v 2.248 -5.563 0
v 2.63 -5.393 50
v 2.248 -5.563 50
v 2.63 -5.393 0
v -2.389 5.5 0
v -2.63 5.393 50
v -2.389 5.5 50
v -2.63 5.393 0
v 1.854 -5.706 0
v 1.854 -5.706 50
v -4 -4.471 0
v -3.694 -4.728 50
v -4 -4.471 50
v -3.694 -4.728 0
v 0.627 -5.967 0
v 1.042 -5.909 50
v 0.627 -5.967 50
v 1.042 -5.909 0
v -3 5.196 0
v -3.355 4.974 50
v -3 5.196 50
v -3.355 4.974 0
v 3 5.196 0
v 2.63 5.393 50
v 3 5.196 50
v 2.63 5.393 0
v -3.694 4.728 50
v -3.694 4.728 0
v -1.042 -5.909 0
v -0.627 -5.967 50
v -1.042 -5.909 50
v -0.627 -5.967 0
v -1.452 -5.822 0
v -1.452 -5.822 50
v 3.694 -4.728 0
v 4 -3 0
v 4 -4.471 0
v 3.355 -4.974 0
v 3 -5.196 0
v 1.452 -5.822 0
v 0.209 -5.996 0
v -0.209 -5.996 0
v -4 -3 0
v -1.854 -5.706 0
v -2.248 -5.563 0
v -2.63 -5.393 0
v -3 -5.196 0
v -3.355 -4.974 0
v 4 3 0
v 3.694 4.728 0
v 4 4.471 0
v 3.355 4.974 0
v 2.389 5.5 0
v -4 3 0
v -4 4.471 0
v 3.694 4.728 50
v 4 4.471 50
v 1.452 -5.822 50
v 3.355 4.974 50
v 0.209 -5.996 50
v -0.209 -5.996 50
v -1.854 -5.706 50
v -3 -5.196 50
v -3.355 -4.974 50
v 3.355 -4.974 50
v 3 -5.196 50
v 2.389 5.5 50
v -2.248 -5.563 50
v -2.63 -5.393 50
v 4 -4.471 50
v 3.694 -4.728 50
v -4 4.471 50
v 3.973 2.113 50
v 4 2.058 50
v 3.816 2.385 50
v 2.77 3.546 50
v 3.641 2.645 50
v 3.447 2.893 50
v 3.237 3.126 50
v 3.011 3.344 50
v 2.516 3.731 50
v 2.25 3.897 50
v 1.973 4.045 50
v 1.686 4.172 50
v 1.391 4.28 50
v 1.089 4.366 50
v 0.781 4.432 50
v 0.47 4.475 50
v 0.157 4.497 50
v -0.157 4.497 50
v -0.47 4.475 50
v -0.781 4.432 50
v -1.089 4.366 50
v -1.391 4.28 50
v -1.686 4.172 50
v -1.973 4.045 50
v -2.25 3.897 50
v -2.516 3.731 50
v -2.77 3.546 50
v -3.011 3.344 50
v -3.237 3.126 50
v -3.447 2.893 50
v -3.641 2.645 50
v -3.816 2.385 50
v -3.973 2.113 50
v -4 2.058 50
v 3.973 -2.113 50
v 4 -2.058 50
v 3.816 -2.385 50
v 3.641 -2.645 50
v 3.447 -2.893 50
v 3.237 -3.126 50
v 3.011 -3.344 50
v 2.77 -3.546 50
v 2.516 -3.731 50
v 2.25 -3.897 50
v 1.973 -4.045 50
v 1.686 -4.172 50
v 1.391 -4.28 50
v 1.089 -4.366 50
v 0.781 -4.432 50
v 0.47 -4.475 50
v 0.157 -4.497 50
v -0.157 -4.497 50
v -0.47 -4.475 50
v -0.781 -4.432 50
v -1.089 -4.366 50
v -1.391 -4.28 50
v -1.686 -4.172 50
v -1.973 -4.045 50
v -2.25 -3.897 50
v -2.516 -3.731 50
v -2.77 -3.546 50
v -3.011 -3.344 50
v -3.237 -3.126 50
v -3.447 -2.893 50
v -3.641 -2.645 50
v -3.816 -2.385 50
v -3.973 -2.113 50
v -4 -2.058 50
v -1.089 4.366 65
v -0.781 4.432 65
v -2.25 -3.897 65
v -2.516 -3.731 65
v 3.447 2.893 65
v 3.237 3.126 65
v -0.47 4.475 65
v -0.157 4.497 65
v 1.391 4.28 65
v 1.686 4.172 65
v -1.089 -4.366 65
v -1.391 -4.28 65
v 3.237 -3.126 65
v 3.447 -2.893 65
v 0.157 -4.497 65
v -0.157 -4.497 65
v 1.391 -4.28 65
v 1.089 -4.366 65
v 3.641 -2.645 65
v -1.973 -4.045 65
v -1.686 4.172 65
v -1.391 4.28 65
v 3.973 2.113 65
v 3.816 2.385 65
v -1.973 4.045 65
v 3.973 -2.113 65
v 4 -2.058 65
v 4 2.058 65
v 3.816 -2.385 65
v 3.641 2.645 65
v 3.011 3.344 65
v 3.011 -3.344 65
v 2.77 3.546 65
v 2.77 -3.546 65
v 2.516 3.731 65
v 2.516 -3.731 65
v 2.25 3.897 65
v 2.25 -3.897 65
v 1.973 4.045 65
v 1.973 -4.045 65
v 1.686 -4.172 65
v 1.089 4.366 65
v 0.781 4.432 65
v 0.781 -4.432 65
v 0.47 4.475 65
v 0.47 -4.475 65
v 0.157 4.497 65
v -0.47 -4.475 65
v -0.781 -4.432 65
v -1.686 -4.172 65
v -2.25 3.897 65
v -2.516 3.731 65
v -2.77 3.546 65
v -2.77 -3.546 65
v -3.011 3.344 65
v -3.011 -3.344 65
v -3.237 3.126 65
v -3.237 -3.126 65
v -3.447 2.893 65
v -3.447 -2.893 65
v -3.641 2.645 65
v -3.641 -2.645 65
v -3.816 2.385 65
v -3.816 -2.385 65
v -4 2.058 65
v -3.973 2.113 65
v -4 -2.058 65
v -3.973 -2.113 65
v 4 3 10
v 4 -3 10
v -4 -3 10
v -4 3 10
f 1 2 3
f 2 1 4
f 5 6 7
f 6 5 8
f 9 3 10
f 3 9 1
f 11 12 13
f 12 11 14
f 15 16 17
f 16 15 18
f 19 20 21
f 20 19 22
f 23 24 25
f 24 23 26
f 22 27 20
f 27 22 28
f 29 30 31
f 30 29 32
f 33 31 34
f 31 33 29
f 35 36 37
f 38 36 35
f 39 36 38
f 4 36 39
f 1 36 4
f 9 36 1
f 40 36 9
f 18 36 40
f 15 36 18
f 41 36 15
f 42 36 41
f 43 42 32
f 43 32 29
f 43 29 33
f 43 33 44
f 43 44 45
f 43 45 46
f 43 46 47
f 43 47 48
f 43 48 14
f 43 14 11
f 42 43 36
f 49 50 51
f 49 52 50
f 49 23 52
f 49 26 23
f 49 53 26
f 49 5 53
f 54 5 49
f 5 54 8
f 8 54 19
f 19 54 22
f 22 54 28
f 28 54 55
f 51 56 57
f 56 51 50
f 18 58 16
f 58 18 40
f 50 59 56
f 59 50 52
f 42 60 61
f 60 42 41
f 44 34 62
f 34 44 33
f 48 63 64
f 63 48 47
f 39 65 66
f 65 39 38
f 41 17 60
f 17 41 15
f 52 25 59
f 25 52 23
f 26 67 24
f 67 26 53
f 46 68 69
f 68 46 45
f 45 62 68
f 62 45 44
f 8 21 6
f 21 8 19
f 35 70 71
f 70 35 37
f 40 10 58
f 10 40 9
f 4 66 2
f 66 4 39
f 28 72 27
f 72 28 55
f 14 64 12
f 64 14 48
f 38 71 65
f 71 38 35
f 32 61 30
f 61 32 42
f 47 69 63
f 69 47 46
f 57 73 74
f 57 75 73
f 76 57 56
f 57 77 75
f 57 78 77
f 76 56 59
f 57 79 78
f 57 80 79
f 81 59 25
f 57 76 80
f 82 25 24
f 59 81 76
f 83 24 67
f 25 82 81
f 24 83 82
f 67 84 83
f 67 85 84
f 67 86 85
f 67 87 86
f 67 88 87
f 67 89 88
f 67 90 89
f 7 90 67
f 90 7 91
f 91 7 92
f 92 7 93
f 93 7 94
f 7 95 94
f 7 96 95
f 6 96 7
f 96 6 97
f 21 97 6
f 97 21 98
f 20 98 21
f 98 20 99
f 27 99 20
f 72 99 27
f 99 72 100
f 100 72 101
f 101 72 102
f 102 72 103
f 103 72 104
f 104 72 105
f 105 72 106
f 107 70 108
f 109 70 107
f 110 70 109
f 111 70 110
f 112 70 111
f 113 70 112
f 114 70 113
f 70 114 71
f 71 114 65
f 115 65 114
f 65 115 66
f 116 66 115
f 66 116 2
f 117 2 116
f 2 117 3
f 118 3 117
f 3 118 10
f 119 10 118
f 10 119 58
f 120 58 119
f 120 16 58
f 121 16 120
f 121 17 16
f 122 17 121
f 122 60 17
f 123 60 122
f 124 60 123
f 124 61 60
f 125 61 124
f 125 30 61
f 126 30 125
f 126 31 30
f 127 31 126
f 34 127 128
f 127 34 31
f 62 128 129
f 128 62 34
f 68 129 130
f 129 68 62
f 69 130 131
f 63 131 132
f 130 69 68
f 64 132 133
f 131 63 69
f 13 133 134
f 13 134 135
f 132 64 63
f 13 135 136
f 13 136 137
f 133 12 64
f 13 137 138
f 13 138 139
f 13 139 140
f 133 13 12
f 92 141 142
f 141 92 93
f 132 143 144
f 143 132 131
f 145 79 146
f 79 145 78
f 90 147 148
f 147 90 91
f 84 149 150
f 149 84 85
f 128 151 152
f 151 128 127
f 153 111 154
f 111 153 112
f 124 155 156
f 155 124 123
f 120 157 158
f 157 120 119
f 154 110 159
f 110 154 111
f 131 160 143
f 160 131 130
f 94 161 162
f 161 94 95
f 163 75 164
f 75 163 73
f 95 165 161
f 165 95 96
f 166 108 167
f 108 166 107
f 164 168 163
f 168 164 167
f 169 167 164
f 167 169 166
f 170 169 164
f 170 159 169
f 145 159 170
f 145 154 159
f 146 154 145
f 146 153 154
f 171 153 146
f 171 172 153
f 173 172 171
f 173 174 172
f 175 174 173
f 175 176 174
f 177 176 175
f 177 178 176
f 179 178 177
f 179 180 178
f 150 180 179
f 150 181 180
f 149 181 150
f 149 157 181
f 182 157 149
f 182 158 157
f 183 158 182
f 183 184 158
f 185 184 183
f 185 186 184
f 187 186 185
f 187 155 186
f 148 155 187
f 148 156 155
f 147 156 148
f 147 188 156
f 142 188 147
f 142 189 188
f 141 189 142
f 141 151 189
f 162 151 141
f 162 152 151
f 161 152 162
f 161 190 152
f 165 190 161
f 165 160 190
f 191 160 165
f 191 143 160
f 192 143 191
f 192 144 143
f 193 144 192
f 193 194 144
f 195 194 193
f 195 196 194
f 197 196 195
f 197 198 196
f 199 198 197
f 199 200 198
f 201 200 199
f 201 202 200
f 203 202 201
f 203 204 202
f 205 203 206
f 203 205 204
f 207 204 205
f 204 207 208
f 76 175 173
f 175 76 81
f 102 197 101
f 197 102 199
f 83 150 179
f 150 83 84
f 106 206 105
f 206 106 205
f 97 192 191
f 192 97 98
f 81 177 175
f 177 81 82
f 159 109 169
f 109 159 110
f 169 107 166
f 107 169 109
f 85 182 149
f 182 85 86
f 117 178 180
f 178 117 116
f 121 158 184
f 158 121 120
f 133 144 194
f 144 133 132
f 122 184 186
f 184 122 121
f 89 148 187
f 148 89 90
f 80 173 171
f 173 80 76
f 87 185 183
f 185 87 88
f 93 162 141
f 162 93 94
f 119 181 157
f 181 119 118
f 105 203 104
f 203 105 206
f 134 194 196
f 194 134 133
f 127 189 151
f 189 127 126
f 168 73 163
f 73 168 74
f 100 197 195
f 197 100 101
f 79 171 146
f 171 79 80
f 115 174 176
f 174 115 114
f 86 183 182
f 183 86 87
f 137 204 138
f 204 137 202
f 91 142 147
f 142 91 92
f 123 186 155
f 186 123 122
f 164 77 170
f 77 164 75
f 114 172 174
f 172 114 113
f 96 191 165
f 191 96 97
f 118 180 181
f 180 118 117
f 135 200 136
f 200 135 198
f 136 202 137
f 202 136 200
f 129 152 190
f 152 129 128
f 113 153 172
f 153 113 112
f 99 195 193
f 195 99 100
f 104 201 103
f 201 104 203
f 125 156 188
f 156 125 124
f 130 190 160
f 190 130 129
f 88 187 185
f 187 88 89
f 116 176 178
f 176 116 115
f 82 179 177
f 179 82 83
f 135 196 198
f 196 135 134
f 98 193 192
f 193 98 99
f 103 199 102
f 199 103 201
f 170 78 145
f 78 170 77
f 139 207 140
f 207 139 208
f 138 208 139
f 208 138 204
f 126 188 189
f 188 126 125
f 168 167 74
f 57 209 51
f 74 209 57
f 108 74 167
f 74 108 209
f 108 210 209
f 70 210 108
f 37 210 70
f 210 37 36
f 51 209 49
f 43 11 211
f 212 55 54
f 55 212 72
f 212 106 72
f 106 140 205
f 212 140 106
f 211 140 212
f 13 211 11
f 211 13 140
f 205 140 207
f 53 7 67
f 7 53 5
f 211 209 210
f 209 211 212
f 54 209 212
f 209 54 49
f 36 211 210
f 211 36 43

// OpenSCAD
$fa=4; // default minimum facet angle is now 4
$fs=0.05; // default minimum facet size is now 0.05 mm

difference() {
  intersection() {
      translate([-4, -7.5, 0]) cube([8, 13, 65]);
      union() {
        cylinder(r = 6, h=50);
        cylinder(r = 4.5, h = 65);
      }
  }
  translate([-5, -3, -.1]) cube([10, 6, 10.1]);
}
